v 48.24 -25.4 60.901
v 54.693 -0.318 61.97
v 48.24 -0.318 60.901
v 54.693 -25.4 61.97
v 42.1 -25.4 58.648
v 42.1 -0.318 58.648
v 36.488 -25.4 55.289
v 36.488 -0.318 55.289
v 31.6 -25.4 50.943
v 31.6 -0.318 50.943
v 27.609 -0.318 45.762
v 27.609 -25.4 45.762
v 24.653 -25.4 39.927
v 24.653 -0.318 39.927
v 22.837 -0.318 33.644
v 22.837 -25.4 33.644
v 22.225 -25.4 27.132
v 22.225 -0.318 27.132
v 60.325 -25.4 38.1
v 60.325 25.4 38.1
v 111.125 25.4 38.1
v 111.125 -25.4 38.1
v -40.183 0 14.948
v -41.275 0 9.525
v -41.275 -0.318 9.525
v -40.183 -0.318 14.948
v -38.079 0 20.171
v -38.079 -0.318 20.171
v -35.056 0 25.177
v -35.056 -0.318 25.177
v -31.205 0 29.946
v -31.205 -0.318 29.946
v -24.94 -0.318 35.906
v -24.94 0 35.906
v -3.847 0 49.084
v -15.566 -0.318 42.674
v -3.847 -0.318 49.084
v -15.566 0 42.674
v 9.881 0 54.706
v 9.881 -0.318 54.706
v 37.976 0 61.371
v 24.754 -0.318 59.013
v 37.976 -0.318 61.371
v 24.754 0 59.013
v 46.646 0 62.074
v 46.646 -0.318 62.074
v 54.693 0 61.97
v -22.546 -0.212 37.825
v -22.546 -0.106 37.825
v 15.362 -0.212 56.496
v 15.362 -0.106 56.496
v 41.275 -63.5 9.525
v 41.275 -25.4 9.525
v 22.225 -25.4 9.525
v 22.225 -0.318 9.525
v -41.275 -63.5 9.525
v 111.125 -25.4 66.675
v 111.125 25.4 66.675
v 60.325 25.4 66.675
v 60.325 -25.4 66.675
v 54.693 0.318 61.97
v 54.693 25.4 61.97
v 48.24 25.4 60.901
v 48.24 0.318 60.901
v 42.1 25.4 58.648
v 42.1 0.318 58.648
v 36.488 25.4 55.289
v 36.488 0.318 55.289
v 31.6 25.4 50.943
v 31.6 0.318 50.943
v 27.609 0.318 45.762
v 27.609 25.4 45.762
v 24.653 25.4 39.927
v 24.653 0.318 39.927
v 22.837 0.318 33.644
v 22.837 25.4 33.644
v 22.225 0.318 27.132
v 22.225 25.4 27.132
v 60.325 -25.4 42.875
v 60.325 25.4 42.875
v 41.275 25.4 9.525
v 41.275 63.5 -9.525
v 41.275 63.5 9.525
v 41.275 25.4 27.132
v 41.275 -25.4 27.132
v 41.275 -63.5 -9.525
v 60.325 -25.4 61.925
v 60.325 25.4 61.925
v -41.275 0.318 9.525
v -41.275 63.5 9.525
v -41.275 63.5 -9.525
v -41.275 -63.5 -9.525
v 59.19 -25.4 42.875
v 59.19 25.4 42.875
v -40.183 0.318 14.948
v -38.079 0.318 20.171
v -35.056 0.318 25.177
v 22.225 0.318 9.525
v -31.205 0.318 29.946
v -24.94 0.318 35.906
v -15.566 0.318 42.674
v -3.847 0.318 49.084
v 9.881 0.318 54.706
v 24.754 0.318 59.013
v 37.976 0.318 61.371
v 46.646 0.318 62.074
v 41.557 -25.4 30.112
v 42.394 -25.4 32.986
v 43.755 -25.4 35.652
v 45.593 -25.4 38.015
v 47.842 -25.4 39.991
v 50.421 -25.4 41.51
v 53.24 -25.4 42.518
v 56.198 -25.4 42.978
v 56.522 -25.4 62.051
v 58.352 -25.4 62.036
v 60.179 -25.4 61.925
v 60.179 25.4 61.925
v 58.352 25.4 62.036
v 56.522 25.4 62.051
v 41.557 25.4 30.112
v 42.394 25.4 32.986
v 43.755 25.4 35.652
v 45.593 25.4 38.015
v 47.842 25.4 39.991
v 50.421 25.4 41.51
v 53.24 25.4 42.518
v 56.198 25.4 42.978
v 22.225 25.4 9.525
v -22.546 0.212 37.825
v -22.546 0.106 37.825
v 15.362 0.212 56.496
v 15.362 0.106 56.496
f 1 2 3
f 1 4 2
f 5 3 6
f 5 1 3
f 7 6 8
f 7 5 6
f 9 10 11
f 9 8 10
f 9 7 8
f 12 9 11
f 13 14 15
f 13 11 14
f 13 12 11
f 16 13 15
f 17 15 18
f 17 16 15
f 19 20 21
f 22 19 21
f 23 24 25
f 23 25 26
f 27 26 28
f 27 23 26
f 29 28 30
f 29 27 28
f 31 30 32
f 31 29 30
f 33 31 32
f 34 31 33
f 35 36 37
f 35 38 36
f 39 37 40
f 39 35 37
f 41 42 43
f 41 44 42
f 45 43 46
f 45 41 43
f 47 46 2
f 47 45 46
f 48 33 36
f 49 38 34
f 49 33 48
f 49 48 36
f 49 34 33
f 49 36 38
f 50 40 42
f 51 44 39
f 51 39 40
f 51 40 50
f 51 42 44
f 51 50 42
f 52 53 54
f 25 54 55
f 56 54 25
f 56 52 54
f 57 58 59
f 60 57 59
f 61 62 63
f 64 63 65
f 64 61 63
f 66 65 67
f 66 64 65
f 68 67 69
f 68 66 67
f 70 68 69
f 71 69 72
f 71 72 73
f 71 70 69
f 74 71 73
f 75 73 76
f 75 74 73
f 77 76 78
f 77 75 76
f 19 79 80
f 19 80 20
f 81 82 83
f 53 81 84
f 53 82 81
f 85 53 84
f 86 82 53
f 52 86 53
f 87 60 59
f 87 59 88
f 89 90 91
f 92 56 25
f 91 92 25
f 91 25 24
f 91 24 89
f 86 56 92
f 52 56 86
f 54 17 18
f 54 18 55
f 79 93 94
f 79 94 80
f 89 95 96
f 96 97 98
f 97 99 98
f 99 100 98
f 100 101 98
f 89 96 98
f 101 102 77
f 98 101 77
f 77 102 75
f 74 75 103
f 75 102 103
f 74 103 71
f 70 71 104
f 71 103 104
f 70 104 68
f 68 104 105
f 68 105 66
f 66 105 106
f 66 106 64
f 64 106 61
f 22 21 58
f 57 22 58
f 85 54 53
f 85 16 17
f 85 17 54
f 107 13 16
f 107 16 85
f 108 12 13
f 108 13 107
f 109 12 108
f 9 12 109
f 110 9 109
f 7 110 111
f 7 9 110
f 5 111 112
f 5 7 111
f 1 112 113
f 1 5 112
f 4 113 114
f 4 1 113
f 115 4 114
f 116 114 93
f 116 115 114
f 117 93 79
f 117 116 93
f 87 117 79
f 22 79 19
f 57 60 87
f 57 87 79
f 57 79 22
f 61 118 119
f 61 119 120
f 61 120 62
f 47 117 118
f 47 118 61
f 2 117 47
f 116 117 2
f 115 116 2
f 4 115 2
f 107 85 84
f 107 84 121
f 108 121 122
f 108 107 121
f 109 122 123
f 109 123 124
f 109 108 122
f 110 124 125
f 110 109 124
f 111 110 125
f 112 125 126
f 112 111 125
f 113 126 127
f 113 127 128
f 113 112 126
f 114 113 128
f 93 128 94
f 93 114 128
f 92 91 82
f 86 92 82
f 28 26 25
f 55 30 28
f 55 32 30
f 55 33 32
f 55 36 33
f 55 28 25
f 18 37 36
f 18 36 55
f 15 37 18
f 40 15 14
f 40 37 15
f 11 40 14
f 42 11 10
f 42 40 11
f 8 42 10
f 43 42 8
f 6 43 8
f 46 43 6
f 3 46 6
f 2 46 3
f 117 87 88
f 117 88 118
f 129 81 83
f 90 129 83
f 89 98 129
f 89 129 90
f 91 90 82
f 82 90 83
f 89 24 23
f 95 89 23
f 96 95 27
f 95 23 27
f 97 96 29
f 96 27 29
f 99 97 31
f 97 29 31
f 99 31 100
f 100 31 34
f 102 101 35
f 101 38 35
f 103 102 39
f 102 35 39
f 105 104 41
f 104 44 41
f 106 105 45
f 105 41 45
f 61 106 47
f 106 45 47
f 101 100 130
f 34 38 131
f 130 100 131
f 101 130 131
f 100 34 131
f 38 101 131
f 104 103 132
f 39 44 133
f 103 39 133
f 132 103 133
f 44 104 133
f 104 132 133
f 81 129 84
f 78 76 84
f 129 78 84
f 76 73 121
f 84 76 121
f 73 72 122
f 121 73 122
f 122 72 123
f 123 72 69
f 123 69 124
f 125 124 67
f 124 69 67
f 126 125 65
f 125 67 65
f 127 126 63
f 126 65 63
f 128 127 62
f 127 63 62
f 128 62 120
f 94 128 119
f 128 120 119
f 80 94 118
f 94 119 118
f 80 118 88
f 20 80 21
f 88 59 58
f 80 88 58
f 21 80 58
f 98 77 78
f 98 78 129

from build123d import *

# Parameters (mm, degrees)
F1_DEPTH = 63.5
F2_DEPTH = 25.4
F3_DEPTH = 0.3175


with BuildPart() as f1:
    # F0 (on Front) → F1 (new body, symmetric)
    with BuildSketch(Plane.XZ):
        Polygon((41.275, -9.525), (41.275, 9.525), (22.225, 9.525), (-41.275, 9.525), (-41.275, -9.525), align=None)
    extrude(amount=F1_DEPTH, both=True)

    # F0 (on Front) → F2 (join, symmetric)
    with BuildSketch(Plane.XZ):
        with BuildLine():
            Line((22.225, 9.525), (41.275, 9.525))
            Line((41.275, 9.525), (41.275, 27.131808))
            ThreePointArc((41.275, 27.131808), (46.670684, 39.056554), (59.189906, 42.8752))
            Line((59.189906, 42.8752), (60.325, 42.8752))
            Line((60.325, 42.8752), (60.325, 61.9252))
            Line((60.325, 61.9252), (60.179103, 61.9252))
            ThreePointArc((60.179103, 61.9252), (57.43684, 62.05563), (54.692804, 61.970261))
            ThreePointArc((54.692804, 61.970261), (31.600311, 50.942919), (22.225, 27.131808))
            Line((22.225, 27.131808), (22.225, 9.525))
        make_face()
        Polygon((60.325, 61.9252), (60.325, 42.8752), (60.325, 38.1), (111.125, 38.1), (111.125, 66.675), (60.325, 66.675), align=None)
    extrude(amount=F2_DEPTH, both=True)

    # F0 (on Front) → F3 (join, symmetric)
    with BuildSketch(Plane.XZ):
        with BuildLine():
            Line((-41.275, 9.525), (22.225, 9.525))
            Line((22.225, 9.525), (22.225, 27.131808))
            ThreePointArc((22.225, 27.131808), (31.600311, 50.942919), (54.692804, 61.970261))
            add(Edge.make_bspline(
                [(-41.275, 9.525), (-38.055819, 41.44999), (20.570714, 64.283475), (54.692804, 61.970261)],
                knots=[0, 0, 0, 0, 109.36327, 109.36327, 109.36327, 109.36327], degree=3))
        make_face()
    extrude(amount=F3_DEPTH, both=True)


solid = f1.part
